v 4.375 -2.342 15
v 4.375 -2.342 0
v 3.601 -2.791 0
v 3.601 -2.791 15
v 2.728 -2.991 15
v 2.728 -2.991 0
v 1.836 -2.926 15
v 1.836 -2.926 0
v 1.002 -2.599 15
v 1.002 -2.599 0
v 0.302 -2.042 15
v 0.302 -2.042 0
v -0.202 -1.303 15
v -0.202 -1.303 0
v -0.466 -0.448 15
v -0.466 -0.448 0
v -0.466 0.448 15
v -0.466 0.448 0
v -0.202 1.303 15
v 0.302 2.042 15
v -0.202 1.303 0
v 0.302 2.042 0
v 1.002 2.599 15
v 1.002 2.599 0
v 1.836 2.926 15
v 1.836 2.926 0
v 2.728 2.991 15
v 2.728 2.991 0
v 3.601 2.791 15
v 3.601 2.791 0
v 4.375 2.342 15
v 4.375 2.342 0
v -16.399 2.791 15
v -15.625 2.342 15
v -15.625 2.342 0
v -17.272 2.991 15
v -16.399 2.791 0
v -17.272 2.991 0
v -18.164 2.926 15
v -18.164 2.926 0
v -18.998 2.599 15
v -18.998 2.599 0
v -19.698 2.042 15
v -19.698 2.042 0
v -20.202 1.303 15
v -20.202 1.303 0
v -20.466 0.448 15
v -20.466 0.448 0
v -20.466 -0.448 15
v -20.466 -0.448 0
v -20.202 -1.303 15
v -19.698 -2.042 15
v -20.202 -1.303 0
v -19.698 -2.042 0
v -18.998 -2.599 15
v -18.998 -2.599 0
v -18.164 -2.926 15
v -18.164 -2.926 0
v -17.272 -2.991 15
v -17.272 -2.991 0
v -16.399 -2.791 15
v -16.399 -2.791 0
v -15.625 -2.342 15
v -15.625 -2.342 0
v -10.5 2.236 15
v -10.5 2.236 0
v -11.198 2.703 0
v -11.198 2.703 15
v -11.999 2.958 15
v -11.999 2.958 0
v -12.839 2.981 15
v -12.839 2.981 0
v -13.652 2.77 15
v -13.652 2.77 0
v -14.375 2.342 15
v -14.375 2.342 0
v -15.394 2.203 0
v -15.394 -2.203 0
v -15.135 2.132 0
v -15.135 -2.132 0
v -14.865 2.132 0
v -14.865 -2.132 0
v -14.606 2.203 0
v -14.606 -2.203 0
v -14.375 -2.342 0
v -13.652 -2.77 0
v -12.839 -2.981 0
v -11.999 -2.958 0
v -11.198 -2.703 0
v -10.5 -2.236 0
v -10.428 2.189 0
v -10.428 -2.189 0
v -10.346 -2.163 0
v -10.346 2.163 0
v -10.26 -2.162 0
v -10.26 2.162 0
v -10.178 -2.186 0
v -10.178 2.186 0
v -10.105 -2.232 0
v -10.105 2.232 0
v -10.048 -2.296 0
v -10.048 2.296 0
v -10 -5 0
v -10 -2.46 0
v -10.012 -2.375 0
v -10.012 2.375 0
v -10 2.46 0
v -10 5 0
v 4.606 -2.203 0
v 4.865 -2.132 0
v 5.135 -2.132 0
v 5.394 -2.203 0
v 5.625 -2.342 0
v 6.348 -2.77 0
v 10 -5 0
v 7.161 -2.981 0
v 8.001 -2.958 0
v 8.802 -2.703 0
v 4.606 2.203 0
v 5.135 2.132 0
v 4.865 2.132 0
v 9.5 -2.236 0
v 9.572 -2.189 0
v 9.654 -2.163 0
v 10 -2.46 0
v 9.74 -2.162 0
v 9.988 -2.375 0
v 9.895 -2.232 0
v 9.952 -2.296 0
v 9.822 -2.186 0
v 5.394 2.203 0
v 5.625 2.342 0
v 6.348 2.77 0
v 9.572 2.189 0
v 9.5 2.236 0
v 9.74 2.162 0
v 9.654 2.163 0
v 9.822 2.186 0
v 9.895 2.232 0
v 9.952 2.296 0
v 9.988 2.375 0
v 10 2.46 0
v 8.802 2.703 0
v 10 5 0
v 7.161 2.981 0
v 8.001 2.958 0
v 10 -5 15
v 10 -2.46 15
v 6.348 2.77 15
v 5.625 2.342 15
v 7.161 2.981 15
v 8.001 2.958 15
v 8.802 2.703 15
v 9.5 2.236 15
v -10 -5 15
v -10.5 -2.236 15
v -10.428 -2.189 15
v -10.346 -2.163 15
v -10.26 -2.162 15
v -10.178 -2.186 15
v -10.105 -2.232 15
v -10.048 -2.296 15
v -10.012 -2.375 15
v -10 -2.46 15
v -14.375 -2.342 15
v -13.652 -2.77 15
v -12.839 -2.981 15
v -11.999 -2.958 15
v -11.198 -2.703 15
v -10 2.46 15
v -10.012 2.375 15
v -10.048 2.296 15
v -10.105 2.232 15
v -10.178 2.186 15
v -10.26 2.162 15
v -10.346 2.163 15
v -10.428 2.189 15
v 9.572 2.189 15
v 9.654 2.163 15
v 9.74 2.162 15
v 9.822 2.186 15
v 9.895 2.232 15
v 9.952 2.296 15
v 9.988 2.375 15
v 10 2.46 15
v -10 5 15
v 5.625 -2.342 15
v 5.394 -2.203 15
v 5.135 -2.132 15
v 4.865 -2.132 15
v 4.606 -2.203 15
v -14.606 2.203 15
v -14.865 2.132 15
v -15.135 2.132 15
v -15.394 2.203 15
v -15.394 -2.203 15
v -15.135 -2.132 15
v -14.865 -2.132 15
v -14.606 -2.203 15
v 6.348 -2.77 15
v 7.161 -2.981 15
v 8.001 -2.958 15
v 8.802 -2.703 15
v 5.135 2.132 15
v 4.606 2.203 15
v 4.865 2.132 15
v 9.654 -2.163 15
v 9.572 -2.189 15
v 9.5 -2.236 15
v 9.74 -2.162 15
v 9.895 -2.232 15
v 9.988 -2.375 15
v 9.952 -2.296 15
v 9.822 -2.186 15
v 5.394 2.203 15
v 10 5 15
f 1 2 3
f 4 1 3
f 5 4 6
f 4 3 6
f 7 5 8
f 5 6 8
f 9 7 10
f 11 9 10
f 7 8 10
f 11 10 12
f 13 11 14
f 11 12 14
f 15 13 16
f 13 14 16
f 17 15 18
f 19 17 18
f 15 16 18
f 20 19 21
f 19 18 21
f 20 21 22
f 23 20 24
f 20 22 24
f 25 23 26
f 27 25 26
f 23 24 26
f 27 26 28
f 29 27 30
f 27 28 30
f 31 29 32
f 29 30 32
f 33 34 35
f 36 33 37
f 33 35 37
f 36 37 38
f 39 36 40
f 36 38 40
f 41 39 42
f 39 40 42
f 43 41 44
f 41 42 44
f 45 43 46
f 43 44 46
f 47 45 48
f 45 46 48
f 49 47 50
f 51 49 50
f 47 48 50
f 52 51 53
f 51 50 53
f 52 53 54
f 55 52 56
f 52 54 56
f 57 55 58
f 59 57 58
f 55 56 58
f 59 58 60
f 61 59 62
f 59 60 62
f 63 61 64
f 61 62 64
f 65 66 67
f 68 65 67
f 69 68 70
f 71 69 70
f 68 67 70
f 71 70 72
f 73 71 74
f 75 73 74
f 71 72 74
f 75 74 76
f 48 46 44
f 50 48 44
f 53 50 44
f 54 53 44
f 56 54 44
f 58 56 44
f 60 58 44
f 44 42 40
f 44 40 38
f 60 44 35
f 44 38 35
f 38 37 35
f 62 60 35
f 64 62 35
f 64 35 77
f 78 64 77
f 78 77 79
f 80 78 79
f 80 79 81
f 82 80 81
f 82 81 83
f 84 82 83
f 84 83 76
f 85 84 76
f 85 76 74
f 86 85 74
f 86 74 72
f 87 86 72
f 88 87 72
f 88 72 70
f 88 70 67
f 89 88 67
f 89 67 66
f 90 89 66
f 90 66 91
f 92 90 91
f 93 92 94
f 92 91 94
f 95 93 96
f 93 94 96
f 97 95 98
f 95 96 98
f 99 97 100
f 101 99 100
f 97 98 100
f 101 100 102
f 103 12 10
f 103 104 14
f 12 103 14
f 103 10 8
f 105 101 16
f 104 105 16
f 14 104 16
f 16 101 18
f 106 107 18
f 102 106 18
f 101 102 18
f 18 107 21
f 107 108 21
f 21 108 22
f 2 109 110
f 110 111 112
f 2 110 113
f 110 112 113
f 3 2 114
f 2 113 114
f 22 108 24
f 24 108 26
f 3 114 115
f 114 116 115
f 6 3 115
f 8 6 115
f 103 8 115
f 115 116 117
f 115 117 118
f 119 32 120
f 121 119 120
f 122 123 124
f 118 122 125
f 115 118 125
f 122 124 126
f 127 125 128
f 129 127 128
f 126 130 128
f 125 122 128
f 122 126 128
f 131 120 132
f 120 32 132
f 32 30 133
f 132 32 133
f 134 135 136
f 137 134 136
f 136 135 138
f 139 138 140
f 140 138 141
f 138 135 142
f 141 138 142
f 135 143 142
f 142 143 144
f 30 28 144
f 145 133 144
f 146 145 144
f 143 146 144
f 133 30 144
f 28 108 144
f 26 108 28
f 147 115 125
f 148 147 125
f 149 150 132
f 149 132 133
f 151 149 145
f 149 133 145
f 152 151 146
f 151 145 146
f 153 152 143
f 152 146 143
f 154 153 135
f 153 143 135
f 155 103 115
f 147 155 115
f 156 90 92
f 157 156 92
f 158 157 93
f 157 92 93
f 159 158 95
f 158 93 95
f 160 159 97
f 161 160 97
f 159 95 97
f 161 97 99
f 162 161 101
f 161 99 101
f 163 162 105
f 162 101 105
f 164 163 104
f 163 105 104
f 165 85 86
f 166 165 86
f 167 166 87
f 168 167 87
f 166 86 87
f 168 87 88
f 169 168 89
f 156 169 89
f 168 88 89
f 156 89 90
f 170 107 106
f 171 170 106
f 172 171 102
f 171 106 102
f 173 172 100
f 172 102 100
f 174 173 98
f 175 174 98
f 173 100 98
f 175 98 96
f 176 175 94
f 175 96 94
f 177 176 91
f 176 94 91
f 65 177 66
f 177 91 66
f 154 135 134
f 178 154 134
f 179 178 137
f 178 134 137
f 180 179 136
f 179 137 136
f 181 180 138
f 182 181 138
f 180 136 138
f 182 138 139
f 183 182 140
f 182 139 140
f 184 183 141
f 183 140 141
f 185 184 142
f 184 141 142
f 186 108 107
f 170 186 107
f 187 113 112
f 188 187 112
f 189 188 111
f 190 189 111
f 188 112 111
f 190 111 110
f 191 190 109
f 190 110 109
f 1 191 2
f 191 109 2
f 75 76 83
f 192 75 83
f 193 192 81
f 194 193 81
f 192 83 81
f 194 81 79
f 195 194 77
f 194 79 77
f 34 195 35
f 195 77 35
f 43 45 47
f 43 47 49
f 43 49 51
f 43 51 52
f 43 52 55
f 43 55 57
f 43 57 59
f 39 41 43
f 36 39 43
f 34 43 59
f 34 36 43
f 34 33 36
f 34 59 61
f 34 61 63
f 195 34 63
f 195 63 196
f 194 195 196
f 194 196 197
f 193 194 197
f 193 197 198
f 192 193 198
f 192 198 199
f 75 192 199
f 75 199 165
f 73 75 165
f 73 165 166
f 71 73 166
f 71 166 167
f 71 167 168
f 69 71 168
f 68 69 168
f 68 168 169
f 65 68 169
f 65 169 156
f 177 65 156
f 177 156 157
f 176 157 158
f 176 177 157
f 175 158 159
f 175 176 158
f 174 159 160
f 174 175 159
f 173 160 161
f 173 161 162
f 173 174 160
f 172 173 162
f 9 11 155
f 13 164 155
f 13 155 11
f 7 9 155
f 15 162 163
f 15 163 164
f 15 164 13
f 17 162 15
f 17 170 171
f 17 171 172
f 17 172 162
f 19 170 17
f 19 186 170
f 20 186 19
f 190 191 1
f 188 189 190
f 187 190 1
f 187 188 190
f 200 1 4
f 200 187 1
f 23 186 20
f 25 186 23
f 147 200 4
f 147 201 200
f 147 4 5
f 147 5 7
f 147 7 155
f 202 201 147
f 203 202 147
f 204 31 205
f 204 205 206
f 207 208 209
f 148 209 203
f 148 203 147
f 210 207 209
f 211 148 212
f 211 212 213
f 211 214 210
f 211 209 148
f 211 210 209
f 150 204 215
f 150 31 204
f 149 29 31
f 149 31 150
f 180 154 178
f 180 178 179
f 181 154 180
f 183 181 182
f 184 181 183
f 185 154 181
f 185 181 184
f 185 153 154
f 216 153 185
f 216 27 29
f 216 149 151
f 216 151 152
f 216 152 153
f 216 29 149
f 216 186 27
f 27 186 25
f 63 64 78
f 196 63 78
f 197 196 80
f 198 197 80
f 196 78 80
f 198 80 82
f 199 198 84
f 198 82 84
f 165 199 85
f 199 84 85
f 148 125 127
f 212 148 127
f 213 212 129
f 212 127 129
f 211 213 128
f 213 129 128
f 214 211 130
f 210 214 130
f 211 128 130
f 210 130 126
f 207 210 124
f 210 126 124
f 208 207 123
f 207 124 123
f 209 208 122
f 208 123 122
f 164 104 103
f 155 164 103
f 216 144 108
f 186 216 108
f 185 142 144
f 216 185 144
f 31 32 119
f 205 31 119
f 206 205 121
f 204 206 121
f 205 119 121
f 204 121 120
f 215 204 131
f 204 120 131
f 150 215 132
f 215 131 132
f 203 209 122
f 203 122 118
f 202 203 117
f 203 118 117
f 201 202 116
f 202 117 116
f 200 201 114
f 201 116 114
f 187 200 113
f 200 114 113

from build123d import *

# Parameters (mm, degrees)
F1_DEPTH = 15


with BuildPart() as f1:
    # F0 (on Top) → F1 (new body)
    with BuildSketch(Plane.XY):
        with BuildLine():
            Line((-10, -5), (10, -5))
            Line((10, -5), (10, -2.459675))
            ThreePointArc((10, -2.459675), (9.822474, -2.185813), (9.5, -2.236068))
            ThreePointArc((9.5, -2.236068), (7.581884, -2.998882), (5.625, -2.341874))
            ThreePointArc((5.625, -2.341874), (5, -2.122499), (4.375, -2.341874))
            ThreePointArc((4.375, -2.341874), (-0.5, 0), (4.375, 2.341874))
            ThreePointArc((4.375, 2.341874), (5, 2.122499), (5.625, 2.341874))
            ThreePointArc((5.625, 2.341874), (7.581884, 2.998882), (9.5, 2.236068))
            ThreePointArc((9.5, 2.236068), (9.822474, 2.185813), (10, 2.459675))
            Line((10, 2.459675), (10, 5))
            Line((10, 5), (-10, 5))
            Line((-10, 5), (-10, 2.459675))
            ThreePointArc((-10, 2.459675), (-10.177526, 2.185813), (-10.5, 2.236068))
            ThreePointArc((-10.5, 2.236068), (-12.418116, 2.998882), (-14.375, 2.341874))
            ThreePointArc((-14.375, 2.341874), (-15, 2.122499), (-15.625, 2.341874))
            ThreePointArc((-15.625, 2.341874), (-20.5, 0), (-15.625, -2.341874))
            ThreePointArc((-15.625, -2.341874), (-15, -2.122499), (-14.375, -2.341874))
            ThreePointArc((-14.375, -2.341874), (-12.418116, -2.998882), (-10.5, -2.236068))
            ThreePointArc((-10.5, -2.236068), (-10.177526, -2.185813), (-10, -2.459675))
            Line((-10, -2.459675), (-10, -5))
        make_face()
    extrude(amount=F1_DEPTH)


solid = f1.part
